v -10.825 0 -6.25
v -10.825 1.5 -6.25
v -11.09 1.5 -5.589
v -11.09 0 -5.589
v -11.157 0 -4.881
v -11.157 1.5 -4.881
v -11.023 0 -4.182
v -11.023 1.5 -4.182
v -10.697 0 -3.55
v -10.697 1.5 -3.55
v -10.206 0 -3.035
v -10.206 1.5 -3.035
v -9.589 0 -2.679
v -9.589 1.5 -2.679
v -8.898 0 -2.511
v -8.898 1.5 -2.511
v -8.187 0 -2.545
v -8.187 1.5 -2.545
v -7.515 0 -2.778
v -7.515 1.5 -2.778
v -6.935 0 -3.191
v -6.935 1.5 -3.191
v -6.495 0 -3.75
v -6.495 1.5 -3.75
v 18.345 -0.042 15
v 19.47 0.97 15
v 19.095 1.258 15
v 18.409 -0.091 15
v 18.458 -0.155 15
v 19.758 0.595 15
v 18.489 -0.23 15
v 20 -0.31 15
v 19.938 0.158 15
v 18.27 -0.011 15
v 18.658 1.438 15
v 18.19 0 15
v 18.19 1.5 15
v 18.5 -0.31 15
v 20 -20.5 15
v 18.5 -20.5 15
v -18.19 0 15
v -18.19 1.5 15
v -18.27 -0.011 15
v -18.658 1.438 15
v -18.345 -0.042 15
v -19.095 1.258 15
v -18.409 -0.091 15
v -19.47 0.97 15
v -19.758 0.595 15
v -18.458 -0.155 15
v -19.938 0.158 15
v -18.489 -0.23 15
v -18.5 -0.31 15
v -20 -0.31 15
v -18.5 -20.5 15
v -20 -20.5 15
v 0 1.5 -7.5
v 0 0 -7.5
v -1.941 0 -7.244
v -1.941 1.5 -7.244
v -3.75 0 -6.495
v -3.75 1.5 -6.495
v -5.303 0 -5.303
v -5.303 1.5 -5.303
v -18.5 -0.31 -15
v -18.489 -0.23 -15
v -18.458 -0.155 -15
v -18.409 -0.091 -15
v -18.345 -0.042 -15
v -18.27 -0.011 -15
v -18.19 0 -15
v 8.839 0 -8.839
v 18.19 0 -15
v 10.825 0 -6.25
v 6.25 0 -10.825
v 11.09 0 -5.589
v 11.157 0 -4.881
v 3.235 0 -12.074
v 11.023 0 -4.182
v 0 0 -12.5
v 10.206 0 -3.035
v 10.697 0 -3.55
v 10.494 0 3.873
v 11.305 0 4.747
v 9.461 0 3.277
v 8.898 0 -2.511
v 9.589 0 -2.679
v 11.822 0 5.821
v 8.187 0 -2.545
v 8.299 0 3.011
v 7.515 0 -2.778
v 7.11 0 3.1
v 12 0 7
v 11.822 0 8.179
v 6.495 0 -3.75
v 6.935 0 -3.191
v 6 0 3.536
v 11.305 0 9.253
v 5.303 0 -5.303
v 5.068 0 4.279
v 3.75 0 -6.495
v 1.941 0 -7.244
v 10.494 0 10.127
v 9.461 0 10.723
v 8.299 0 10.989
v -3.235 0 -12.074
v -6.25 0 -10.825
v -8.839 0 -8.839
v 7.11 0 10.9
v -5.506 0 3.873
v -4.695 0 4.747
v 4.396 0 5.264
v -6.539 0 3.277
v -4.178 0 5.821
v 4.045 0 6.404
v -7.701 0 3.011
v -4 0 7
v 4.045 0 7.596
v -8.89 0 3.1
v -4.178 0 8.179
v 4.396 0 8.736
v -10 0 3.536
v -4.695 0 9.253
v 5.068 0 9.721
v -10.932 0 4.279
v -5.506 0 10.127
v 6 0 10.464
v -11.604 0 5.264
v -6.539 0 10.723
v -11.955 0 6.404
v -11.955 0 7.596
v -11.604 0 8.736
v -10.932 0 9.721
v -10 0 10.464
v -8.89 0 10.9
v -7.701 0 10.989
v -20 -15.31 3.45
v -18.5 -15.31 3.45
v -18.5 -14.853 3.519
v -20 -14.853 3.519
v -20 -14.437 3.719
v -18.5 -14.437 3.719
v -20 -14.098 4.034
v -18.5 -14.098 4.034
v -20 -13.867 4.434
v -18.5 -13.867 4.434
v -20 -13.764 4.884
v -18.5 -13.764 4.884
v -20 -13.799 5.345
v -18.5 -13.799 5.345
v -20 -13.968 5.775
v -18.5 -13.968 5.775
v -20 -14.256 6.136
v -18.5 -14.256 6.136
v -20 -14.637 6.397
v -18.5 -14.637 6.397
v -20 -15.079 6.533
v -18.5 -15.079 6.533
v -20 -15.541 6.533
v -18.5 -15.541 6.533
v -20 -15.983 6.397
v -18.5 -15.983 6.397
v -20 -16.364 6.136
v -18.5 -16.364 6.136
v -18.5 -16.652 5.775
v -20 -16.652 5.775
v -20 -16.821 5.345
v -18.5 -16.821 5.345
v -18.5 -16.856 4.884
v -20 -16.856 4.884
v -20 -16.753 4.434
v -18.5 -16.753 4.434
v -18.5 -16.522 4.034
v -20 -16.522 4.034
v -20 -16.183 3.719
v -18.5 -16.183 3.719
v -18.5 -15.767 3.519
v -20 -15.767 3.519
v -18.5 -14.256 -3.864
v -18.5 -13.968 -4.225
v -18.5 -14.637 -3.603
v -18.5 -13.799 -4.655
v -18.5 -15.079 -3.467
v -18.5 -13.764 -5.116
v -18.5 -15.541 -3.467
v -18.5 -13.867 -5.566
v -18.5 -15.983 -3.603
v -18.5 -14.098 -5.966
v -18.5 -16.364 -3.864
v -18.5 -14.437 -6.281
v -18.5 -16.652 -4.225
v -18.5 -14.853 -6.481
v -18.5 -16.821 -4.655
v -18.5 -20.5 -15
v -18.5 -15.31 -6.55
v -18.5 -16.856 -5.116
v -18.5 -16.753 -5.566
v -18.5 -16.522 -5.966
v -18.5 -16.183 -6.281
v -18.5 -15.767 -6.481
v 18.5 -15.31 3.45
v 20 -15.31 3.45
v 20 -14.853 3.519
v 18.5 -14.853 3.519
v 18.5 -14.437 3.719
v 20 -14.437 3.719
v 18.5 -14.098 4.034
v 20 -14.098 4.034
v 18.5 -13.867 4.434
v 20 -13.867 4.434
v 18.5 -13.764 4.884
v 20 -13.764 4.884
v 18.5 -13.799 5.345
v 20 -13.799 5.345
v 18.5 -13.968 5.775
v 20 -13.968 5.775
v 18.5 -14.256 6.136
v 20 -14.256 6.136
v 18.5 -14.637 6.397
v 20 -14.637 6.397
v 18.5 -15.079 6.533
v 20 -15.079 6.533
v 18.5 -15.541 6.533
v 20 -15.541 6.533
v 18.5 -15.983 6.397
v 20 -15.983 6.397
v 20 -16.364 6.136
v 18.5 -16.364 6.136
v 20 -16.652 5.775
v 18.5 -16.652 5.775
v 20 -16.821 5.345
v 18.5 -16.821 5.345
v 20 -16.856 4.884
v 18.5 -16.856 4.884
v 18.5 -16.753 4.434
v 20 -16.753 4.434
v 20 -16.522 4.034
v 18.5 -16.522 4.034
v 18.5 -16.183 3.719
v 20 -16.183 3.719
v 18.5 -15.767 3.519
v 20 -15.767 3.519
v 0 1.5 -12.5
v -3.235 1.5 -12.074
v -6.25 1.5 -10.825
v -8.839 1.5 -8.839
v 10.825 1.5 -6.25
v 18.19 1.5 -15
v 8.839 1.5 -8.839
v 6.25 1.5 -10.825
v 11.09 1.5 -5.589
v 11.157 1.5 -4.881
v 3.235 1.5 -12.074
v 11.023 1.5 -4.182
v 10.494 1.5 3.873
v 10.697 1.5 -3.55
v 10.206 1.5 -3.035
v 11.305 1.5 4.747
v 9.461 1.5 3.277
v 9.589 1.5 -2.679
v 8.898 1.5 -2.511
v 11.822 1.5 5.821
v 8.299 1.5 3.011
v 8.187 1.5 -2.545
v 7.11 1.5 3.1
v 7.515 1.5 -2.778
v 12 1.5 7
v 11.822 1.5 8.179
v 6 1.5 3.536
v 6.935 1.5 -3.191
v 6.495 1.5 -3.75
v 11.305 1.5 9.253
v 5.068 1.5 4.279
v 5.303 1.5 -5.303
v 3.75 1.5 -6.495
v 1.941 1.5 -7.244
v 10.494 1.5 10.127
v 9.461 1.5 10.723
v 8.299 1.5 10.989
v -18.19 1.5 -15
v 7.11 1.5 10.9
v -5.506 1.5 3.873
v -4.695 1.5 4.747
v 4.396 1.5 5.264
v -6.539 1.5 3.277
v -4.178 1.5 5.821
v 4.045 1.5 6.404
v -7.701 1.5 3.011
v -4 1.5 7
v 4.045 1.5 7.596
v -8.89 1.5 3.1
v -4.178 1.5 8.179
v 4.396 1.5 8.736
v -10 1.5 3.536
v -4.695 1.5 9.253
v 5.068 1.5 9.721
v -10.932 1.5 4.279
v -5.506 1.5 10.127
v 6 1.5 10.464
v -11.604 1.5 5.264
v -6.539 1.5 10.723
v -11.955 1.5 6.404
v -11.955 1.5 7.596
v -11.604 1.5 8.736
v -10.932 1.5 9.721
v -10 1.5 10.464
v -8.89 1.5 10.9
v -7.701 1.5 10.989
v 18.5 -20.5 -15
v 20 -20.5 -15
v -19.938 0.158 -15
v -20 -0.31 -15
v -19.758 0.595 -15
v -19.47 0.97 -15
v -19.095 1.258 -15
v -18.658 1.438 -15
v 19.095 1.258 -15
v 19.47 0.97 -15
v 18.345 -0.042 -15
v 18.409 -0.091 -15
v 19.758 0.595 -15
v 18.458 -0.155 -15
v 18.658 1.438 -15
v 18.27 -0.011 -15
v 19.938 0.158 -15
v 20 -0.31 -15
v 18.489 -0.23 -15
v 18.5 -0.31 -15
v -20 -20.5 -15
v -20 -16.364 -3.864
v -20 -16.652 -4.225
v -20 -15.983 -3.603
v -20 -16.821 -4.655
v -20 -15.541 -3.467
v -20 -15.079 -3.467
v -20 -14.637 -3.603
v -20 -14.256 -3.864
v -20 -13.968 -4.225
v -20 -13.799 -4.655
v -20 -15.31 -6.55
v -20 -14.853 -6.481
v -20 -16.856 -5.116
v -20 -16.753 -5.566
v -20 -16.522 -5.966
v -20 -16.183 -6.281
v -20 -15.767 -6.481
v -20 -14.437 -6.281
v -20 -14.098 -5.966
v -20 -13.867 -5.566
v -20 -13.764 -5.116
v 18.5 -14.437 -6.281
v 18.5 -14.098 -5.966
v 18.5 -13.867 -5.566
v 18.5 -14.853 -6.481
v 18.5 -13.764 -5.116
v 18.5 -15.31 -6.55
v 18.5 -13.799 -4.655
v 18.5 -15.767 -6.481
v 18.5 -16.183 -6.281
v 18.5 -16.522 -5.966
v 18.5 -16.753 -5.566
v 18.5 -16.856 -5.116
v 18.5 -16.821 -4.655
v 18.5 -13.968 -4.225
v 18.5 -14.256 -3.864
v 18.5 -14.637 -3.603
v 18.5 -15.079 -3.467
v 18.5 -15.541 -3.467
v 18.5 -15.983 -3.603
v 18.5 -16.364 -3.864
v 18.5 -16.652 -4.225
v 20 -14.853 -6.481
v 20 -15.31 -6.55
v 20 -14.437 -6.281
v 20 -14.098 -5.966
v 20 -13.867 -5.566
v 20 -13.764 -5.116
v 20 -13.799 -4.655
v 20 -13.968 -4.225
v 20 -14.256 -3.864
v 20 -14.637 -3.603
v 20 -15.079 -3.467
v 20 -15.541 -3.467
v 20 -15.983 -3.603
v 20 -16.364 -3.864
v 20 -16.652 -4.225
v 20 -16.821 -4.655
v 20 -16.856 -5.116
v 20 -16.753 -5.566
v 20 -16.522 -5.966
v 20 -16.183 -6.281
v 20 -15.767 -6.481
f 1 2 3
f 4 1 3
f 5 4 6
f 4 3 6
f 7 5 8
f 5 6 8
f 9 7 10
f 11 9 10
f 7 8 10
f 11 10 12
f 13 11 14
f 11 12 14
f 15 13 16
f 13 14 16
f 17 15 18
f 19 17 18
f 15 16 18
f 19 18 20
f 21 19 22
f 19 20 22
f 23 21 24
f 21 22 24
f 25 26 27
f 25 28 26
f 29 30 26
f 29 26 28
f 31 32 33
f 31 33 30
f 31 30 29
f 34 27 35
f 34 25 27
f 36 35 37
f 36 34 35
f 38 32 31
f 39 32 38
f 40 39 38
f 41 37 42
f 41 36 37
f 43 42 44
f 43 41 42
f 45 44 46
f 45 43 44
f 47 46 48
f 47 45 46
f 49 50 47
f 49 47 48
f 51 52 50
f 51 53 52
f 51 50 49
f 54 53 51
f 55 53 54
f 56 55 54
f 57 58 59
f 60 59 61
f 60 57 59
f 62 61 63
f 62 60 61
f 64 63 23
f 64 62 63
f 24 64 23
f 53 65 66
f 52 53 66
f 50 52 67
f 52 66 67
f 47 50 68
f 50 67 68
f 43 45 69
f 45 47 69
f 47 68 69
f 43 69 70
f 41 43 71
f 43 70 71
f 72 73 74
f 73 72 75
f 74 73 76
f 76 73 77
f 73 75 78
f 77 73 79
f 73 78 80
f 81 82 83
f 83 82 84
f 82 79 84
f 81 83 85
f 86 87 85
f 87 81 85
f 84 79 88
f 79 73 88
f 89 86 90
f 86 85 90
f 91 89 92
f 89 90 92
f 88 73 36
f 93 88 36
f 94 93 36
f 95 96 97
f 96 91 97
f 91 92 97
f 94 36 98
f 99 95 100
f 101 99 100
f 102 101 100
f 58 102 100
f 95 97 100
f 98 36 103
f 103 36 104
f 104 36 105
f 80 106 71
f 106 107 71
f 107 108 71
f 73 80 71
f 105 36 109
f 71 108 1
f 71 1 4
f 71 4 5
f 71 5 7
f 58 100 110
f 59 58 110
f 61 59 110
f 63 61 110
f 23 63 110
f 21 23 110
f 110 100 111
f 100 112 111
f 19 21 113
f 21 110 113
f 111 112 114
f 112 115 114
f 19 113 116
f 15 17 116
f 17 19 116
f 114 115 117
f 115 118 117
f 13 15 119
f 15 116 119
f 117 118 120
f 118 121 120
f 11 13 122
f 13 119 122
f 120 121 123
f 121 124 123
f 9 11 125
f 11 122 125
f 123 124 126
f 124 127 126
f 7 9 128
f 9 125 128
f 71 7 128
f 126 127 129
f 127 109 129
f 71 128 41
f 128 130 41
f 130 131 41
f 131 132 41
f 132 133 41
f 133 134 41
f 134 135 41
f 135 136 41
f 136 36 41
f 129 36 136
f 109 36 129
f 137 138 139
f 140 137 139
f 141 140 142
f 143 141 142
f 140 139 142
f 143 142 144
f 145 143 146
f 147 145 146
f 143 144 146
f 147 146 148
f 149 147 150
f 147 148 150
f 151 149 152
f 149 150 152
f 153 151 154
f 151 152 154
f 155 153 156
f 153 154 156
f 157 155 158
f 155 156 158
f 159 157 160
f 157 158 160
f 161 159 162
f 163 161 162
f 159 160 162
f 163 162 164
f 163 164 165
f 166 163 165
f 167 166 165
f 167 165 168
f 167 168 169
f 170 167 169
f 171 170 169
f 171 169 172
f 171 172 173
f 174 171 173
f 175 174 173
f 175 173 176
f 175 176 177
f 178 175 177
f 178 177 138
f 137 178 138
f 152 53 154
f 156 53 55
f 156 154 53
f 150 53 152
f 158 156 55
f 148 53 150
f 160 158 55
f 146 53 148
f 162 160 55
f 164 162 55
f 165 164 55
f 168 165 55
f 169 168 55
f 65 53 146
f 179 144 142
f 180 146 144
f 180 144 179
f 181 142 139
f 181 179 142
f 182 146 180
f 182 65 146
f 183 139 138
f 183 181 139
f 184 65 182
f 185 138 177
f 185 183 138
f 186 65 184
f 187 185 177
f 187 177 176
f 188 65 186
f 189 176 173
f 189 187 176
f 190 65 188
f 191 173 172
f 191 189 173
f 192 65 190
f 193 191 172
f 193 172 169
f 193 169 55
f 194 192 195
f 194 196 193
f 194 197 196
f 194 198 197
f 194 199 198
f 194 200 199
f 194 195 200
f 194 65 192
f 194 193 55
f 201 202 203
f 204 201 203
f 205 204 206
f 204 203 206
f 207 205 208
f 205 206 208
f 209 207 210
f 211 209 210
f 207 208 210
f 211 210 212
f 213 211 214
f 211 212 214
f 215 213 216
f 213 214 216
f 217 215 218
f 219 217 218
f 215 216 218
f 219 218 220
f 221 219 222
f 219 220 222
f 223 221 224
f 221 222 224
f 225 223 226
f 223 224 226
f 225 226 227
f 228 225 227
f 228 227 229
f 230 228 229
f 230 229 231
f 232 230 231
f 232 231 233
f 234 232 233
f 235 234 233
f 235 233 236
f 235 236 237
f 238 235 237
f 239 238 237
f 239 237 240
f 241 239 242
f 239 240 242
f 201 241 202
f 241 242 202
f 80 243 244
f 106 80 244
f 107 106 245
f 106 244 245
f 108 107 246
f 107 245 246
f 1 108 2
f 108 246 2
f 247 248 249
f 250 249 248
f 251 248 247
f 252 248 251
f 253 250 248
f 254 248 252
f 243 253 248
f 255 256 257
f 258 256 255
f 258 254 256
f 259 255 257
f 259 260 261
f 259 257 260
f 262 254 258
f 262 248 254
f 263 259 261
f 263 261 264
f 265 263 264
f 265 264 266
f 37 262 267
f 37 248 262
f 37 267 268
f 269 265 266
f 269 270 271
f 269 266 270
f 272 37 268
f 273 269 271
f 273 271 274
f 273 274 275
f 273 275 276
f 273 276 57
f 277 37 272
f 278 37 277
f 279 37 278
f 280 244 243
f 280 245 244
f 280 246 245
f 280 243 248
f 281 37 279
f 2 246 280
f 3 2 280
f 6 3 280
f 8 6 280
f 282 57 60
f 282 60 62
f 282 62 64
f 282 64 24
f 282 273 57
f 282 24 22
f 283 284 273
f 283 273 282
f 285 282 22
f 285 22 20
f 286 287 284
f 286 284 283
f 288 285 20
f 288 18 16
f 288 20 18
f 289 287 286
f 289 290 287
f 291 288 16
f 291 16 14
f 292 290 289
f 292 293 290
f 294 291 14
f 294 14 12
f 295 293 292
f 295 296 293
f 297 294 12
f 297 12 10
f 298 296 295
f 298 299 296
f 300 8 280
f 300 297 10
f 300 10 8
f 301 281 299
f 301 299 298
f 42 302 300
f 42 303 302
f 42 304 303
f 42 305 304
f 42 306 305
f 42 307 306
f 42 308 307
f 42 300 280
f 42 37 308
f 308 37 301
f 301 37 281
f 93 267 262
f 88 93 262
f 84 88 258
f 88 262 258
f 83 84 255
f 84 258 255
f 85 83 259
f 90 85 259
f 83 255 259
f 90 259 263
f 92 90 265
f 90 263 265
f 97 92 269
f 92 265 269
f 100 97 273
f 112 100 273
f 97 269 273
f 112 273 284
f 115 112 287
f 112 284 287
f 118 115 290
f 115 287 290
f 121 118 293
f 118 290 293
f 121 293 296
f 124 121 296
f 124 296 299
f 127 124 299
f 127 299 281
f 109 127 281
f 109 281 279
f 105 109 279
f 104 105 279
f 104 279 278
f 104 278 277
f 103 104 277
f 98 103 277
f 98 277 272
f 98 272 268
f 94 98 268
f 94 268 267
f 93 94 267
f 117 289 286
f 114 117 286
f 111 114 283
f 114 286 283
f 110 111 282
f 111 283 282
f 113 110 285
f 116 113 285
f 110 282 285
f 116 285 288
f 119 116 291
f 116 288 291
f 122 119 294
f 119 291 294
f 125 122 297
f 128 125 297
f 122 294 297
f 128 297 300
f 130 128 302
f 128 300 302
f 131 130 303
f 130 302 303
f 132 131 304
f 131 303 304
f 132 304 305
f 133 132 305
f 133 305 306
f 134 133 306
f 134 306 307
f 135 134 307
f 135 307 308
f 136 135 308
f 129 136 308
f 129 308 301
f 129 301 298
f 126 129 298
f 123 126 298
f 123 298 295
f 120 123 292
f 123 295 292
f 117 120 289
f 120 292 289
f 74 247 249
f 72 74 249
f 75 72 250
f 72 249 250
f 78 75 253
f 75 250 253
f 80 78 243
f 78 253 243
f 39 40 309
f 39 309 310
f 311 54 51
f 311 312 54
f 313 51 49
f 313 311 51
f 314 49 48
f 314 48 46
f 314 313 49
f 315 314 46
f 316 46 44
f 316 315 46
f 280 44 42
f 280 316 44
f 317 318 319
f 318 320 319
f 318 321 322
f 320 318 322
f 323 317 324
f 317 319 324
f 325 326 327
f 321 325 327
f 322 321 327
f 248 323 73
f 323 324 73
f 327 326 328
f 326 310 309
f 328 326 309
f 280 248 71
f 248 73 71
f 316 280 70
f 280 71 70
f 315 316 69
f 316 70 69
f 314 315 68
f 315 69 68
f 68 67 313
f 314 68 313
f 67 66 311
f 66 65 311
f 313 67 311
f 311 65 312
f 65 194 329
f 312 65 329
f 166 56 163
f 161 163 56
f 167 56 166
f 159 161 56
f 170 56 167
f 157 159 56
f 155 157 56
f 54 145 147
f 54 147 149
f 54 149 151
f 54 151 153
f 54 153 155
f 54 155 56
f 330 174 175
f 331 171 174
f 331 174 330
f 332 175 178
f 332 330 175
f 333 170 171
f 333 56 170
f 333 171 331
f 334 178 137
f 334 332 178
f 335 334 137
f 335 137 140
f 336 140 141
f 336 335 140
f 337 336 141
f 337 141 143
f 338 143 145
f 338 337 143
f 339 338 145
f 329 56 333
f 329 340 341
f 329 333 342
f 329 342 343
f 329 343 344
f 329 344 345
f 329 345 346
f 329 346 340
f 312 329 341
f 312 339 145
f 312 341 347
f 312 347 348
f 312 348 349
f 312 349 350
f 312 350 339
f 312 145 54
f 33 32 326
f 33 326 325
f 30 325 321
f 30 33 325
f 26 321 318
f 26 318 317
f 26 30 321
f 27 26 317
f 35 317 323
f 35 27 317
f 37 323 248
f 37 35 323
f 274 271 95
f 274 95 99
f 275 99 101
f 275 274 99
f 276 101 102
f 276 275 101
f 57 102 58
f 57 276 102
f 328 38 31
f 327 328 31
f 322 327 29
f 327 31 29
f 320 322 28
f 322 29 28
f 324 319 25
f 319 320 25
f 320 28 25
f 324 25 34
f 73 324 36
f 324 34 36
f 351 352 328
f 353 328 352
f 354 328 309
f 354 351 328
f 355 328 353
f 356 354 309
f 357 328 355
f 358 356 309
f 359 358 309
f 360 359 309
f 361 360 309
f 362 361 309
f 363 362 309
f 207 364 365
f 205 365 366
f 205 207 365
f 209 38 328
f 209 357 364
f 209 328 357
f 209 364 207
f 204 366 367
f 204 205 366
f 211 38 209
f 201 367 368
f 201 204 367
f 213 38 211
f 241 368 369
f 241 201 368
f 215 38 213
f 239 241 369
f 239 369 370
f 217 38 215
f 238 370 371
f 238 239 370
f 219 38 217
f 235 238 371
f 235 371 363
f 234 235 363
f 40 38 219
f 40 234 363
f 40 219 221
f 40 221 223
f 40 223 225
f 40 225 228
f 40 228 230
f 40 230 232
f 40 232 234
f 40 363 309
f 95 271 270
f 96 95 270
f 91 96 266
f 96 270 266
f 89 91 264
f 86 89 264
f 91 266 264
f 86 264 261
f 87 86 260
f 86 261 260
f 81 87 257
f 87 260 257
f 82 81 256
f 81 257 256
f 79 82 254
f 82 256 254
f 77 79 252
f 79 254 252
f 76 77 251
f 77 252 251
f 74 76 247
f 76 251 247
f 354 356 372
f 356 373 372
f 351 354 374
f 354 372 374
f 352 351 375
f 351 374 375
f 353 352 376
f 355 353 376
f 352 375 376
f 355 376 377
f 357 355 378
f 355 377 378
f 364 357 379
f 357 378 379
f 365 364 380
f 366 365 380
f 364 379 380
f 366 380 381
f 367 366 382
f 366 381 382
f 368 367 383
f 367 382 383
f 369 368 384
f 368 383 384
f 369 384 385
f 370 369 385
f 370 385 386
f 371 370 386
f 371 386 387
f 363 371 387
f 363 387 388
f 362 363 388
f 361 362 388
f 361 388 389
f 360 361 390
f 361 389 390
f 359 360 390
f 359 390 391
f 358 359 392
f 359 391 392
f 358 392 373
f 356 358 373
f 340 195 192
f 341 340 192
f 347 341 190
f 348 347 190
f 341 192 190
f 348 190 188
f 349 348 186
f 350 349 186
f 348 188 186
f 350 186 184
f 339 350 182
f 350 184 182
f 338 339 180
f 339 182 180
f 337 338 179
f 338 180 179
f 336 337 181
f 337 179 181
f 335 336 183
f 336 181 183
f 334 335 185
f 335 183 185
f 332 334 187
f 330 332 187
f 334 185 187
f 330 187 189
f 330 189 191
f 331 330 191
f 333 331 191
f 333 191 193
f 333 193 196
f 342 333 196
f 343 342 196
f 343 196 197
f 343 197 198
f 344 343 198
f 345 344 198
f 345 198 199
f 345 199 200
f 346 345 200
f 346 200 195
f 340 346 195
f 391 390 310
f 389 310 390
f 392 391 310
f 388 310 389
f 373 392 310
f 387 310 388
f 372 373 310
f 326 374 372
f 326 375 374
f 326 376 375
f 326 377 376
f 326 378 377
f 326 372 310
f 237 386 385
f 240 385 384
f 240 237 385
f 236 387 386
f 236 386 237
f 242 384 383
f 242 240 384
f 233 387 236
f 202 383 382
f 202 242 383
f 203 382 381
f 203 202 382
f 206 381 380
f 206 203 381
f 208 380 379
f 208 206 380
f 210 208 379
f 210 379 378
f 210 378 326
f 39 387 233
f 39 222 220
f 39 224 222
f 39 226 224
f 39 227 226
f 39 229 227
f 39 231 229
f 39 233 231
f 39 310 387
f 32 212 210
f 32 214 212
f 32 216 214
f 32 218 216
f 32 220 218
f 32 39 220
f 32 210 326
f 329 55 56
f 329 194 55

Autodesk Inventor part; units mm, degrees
ref_plane "YZ Plane" through (0, 0, 0) normal (1, 0, 0) x (0, 1, 0)
ref_plane "XZ Plane" through (0, 0, 0) normal (0, 1, 0) x (-1, 0, 0)
ref_plane "XY Plane" through (0, 0, 0) normal (0, 0, 1) x (1, 0, 0)
sketch "Sketch1" plane through (0, 0, 0) normal (0, 1, 0) x (-1, 0, 0)
  line L0 (20, -15) -> (-20, -15)
  line L1 (-20, -15) -> (-20, 15)
  line L2 (-20, 15) -> (20, 15)
  line L3 (20, 15) -> (20, -15)
  line L4 (20, -15) -> (-20, 15) construction
  line L5 (-20, -15) -> (20, 15) construction
  point P0 (0, 0)
  dimension "d0" = 40
  dimension "d1" = 30
extrude "Plate1" add sketch "Sketch1" along normal blind 1.5
sketch "Sketch2" plane through (18.5, 1.5, 15) normal (1, 0, 0) x (0, 1, 0)
  line L0 (0, -30) -> (0, 0)
  line L1 (0, 0) -> (-22, 0)
  line L2 (-22, 0) -> (-22, -30)
  line L3 (-22, -30) -> (0, -30)
edge flange "Flange1" height 22 angle 90 thickness 1.5 bend radius 0.31 thickness toward (1, 0, 0) relief tear relief width 1.5 relief depth 0.75 corner gap 0.31 corner form 0 edges at (20, 0, 0) (-20, 0, 0) wall of the first edge with corners at (18.5, 1.5, -15) (18.5, 1.5, 15) (18.5, -20.5, 15) (18.5, -20.5, -15)
bend "Bend1"
corner "Corner1"
sketch "Sketch3" plane through (20, -20.5, 15) normal (1, 0, 0) x (0, 0, -1)
  circle A0 centre (20, 5.19) radius 1.55
  circle A1 centre (10, 5.19) radius 1.55
  line L0 (30, 20.19) -> (0, 20.19) projected
  line L1 (30, 0) -> (30, 20.19) projected
  point P0 (15, 20.5)
  dimension "d13" = 3.1
  dimension "d14" = 3.1
  dimension "d15" = 15
  dimension "d16" = 15
  dimension "d17" = 10
  dimension "d33" = 10
extrude "Cut1" cut sketch "Sketch3" against normal through all
sketch "Sketch4" plane through (0, 1.5, 0) normal (0, 1, 0) x (1, 0, 0)
  circle A0 centre (8, -7) radius 4
  circle A1 centre (-8, -7) radius 4
  arc A2 (0, 10) -> (-8.6603, 5) centre (0, 0) ccw construction
  arc A3 (0, 12.5) -> (-10.8253, 6.25) centre (0, 0) ccw
  arc A4 (0, 7.5) -> (-6.4952, 3.75) centre (0, 0) ccw
  arc A5 (0, 7.5) -> (0, 12.5) centre (0, 10) ccw
  arc A6 (-10.8253, 6.25) -> (-6.4952, 3.75) centre (-8.6603, 5) ccw
  line L0 (0, 0) -> (-8.6603, 5) construction
  line L1 (0, 0) -> (0, 10) construction
  arc A7 (8.6603, 5) -> (0, 10) centre (0, 0) ccw construction
  arc A8 (10.8253, 6.25) -> (0, 12.5) centre (0, 0) ccw
  arc A9 (6.4952, 3.75) -> (0, 7.5) centre (0, 0) ccw
  arc A10 (6.4952, 3.75) -> (10.8253, 6.25) centre (8.6603, 5) ccw
  arc A11 (0, 12.5) -> (0, 7.5) centre (0, 10) ccw
  line L2 (0, 0) -> (8.6603, 5) construction
  line L3 (0, 0) -> (0, 10) construction
  dimension "d20" = 8
  dimension "d21" = 8
  dimension "d22" = 10
  dimension "d23" = 60
  dimension "d24" = 5
  dimension "d25" = 60
  dimension "d26" = 5
  dimension "d27" = 7
  dimension "d28" = 7
  dimension "d29" = 8
  dimension "d30" = 8
extrude "Cut2" cut sketch "Sketch4" against normal through all
equation "\"d16\" = d15"
equation "\"d18\" = Thickness"
equation "\"d28\" = d27"
equation "\"d30\" = d29"
equation "\"d31\" = Thickness"
equation "\"d2\" = Thickness"
equation "\"d3\" = BendReliefWidth"
equation "\"d4\" = BendReliefDepth"
equation "\"d5\" = MinimumRemnant"
equation "\"d6\" = TransitionRadius"
equation "\"d9\" = BendRadius"
equation "\"d10\" = CornerReliefSize"
equation "\"d11\" = GapSize"
equation "\"d12\" = JacobiRadiusSize"
equation "\"BendReliefWidth\" = Thickness"
equation "\"BendReliefDepth\" = 0.5 * Thickness"
equation "\"CornerReliefSize\" = 4 * Thickness"
equation "\"MinimumRemnant\" = 2 * Thickness"
equation "\"TransitionRadius\" = BendRadius"
equation "\"JacobiRadiusSize\" = BendRadius"
equation "\"GapSize\" = Thickness"
equation "\"Thickness\" = 1.5"
equation "\"BendRadius\" = 0.31"
properties part number "Head2" material "Aluminum 6061-AHC"
